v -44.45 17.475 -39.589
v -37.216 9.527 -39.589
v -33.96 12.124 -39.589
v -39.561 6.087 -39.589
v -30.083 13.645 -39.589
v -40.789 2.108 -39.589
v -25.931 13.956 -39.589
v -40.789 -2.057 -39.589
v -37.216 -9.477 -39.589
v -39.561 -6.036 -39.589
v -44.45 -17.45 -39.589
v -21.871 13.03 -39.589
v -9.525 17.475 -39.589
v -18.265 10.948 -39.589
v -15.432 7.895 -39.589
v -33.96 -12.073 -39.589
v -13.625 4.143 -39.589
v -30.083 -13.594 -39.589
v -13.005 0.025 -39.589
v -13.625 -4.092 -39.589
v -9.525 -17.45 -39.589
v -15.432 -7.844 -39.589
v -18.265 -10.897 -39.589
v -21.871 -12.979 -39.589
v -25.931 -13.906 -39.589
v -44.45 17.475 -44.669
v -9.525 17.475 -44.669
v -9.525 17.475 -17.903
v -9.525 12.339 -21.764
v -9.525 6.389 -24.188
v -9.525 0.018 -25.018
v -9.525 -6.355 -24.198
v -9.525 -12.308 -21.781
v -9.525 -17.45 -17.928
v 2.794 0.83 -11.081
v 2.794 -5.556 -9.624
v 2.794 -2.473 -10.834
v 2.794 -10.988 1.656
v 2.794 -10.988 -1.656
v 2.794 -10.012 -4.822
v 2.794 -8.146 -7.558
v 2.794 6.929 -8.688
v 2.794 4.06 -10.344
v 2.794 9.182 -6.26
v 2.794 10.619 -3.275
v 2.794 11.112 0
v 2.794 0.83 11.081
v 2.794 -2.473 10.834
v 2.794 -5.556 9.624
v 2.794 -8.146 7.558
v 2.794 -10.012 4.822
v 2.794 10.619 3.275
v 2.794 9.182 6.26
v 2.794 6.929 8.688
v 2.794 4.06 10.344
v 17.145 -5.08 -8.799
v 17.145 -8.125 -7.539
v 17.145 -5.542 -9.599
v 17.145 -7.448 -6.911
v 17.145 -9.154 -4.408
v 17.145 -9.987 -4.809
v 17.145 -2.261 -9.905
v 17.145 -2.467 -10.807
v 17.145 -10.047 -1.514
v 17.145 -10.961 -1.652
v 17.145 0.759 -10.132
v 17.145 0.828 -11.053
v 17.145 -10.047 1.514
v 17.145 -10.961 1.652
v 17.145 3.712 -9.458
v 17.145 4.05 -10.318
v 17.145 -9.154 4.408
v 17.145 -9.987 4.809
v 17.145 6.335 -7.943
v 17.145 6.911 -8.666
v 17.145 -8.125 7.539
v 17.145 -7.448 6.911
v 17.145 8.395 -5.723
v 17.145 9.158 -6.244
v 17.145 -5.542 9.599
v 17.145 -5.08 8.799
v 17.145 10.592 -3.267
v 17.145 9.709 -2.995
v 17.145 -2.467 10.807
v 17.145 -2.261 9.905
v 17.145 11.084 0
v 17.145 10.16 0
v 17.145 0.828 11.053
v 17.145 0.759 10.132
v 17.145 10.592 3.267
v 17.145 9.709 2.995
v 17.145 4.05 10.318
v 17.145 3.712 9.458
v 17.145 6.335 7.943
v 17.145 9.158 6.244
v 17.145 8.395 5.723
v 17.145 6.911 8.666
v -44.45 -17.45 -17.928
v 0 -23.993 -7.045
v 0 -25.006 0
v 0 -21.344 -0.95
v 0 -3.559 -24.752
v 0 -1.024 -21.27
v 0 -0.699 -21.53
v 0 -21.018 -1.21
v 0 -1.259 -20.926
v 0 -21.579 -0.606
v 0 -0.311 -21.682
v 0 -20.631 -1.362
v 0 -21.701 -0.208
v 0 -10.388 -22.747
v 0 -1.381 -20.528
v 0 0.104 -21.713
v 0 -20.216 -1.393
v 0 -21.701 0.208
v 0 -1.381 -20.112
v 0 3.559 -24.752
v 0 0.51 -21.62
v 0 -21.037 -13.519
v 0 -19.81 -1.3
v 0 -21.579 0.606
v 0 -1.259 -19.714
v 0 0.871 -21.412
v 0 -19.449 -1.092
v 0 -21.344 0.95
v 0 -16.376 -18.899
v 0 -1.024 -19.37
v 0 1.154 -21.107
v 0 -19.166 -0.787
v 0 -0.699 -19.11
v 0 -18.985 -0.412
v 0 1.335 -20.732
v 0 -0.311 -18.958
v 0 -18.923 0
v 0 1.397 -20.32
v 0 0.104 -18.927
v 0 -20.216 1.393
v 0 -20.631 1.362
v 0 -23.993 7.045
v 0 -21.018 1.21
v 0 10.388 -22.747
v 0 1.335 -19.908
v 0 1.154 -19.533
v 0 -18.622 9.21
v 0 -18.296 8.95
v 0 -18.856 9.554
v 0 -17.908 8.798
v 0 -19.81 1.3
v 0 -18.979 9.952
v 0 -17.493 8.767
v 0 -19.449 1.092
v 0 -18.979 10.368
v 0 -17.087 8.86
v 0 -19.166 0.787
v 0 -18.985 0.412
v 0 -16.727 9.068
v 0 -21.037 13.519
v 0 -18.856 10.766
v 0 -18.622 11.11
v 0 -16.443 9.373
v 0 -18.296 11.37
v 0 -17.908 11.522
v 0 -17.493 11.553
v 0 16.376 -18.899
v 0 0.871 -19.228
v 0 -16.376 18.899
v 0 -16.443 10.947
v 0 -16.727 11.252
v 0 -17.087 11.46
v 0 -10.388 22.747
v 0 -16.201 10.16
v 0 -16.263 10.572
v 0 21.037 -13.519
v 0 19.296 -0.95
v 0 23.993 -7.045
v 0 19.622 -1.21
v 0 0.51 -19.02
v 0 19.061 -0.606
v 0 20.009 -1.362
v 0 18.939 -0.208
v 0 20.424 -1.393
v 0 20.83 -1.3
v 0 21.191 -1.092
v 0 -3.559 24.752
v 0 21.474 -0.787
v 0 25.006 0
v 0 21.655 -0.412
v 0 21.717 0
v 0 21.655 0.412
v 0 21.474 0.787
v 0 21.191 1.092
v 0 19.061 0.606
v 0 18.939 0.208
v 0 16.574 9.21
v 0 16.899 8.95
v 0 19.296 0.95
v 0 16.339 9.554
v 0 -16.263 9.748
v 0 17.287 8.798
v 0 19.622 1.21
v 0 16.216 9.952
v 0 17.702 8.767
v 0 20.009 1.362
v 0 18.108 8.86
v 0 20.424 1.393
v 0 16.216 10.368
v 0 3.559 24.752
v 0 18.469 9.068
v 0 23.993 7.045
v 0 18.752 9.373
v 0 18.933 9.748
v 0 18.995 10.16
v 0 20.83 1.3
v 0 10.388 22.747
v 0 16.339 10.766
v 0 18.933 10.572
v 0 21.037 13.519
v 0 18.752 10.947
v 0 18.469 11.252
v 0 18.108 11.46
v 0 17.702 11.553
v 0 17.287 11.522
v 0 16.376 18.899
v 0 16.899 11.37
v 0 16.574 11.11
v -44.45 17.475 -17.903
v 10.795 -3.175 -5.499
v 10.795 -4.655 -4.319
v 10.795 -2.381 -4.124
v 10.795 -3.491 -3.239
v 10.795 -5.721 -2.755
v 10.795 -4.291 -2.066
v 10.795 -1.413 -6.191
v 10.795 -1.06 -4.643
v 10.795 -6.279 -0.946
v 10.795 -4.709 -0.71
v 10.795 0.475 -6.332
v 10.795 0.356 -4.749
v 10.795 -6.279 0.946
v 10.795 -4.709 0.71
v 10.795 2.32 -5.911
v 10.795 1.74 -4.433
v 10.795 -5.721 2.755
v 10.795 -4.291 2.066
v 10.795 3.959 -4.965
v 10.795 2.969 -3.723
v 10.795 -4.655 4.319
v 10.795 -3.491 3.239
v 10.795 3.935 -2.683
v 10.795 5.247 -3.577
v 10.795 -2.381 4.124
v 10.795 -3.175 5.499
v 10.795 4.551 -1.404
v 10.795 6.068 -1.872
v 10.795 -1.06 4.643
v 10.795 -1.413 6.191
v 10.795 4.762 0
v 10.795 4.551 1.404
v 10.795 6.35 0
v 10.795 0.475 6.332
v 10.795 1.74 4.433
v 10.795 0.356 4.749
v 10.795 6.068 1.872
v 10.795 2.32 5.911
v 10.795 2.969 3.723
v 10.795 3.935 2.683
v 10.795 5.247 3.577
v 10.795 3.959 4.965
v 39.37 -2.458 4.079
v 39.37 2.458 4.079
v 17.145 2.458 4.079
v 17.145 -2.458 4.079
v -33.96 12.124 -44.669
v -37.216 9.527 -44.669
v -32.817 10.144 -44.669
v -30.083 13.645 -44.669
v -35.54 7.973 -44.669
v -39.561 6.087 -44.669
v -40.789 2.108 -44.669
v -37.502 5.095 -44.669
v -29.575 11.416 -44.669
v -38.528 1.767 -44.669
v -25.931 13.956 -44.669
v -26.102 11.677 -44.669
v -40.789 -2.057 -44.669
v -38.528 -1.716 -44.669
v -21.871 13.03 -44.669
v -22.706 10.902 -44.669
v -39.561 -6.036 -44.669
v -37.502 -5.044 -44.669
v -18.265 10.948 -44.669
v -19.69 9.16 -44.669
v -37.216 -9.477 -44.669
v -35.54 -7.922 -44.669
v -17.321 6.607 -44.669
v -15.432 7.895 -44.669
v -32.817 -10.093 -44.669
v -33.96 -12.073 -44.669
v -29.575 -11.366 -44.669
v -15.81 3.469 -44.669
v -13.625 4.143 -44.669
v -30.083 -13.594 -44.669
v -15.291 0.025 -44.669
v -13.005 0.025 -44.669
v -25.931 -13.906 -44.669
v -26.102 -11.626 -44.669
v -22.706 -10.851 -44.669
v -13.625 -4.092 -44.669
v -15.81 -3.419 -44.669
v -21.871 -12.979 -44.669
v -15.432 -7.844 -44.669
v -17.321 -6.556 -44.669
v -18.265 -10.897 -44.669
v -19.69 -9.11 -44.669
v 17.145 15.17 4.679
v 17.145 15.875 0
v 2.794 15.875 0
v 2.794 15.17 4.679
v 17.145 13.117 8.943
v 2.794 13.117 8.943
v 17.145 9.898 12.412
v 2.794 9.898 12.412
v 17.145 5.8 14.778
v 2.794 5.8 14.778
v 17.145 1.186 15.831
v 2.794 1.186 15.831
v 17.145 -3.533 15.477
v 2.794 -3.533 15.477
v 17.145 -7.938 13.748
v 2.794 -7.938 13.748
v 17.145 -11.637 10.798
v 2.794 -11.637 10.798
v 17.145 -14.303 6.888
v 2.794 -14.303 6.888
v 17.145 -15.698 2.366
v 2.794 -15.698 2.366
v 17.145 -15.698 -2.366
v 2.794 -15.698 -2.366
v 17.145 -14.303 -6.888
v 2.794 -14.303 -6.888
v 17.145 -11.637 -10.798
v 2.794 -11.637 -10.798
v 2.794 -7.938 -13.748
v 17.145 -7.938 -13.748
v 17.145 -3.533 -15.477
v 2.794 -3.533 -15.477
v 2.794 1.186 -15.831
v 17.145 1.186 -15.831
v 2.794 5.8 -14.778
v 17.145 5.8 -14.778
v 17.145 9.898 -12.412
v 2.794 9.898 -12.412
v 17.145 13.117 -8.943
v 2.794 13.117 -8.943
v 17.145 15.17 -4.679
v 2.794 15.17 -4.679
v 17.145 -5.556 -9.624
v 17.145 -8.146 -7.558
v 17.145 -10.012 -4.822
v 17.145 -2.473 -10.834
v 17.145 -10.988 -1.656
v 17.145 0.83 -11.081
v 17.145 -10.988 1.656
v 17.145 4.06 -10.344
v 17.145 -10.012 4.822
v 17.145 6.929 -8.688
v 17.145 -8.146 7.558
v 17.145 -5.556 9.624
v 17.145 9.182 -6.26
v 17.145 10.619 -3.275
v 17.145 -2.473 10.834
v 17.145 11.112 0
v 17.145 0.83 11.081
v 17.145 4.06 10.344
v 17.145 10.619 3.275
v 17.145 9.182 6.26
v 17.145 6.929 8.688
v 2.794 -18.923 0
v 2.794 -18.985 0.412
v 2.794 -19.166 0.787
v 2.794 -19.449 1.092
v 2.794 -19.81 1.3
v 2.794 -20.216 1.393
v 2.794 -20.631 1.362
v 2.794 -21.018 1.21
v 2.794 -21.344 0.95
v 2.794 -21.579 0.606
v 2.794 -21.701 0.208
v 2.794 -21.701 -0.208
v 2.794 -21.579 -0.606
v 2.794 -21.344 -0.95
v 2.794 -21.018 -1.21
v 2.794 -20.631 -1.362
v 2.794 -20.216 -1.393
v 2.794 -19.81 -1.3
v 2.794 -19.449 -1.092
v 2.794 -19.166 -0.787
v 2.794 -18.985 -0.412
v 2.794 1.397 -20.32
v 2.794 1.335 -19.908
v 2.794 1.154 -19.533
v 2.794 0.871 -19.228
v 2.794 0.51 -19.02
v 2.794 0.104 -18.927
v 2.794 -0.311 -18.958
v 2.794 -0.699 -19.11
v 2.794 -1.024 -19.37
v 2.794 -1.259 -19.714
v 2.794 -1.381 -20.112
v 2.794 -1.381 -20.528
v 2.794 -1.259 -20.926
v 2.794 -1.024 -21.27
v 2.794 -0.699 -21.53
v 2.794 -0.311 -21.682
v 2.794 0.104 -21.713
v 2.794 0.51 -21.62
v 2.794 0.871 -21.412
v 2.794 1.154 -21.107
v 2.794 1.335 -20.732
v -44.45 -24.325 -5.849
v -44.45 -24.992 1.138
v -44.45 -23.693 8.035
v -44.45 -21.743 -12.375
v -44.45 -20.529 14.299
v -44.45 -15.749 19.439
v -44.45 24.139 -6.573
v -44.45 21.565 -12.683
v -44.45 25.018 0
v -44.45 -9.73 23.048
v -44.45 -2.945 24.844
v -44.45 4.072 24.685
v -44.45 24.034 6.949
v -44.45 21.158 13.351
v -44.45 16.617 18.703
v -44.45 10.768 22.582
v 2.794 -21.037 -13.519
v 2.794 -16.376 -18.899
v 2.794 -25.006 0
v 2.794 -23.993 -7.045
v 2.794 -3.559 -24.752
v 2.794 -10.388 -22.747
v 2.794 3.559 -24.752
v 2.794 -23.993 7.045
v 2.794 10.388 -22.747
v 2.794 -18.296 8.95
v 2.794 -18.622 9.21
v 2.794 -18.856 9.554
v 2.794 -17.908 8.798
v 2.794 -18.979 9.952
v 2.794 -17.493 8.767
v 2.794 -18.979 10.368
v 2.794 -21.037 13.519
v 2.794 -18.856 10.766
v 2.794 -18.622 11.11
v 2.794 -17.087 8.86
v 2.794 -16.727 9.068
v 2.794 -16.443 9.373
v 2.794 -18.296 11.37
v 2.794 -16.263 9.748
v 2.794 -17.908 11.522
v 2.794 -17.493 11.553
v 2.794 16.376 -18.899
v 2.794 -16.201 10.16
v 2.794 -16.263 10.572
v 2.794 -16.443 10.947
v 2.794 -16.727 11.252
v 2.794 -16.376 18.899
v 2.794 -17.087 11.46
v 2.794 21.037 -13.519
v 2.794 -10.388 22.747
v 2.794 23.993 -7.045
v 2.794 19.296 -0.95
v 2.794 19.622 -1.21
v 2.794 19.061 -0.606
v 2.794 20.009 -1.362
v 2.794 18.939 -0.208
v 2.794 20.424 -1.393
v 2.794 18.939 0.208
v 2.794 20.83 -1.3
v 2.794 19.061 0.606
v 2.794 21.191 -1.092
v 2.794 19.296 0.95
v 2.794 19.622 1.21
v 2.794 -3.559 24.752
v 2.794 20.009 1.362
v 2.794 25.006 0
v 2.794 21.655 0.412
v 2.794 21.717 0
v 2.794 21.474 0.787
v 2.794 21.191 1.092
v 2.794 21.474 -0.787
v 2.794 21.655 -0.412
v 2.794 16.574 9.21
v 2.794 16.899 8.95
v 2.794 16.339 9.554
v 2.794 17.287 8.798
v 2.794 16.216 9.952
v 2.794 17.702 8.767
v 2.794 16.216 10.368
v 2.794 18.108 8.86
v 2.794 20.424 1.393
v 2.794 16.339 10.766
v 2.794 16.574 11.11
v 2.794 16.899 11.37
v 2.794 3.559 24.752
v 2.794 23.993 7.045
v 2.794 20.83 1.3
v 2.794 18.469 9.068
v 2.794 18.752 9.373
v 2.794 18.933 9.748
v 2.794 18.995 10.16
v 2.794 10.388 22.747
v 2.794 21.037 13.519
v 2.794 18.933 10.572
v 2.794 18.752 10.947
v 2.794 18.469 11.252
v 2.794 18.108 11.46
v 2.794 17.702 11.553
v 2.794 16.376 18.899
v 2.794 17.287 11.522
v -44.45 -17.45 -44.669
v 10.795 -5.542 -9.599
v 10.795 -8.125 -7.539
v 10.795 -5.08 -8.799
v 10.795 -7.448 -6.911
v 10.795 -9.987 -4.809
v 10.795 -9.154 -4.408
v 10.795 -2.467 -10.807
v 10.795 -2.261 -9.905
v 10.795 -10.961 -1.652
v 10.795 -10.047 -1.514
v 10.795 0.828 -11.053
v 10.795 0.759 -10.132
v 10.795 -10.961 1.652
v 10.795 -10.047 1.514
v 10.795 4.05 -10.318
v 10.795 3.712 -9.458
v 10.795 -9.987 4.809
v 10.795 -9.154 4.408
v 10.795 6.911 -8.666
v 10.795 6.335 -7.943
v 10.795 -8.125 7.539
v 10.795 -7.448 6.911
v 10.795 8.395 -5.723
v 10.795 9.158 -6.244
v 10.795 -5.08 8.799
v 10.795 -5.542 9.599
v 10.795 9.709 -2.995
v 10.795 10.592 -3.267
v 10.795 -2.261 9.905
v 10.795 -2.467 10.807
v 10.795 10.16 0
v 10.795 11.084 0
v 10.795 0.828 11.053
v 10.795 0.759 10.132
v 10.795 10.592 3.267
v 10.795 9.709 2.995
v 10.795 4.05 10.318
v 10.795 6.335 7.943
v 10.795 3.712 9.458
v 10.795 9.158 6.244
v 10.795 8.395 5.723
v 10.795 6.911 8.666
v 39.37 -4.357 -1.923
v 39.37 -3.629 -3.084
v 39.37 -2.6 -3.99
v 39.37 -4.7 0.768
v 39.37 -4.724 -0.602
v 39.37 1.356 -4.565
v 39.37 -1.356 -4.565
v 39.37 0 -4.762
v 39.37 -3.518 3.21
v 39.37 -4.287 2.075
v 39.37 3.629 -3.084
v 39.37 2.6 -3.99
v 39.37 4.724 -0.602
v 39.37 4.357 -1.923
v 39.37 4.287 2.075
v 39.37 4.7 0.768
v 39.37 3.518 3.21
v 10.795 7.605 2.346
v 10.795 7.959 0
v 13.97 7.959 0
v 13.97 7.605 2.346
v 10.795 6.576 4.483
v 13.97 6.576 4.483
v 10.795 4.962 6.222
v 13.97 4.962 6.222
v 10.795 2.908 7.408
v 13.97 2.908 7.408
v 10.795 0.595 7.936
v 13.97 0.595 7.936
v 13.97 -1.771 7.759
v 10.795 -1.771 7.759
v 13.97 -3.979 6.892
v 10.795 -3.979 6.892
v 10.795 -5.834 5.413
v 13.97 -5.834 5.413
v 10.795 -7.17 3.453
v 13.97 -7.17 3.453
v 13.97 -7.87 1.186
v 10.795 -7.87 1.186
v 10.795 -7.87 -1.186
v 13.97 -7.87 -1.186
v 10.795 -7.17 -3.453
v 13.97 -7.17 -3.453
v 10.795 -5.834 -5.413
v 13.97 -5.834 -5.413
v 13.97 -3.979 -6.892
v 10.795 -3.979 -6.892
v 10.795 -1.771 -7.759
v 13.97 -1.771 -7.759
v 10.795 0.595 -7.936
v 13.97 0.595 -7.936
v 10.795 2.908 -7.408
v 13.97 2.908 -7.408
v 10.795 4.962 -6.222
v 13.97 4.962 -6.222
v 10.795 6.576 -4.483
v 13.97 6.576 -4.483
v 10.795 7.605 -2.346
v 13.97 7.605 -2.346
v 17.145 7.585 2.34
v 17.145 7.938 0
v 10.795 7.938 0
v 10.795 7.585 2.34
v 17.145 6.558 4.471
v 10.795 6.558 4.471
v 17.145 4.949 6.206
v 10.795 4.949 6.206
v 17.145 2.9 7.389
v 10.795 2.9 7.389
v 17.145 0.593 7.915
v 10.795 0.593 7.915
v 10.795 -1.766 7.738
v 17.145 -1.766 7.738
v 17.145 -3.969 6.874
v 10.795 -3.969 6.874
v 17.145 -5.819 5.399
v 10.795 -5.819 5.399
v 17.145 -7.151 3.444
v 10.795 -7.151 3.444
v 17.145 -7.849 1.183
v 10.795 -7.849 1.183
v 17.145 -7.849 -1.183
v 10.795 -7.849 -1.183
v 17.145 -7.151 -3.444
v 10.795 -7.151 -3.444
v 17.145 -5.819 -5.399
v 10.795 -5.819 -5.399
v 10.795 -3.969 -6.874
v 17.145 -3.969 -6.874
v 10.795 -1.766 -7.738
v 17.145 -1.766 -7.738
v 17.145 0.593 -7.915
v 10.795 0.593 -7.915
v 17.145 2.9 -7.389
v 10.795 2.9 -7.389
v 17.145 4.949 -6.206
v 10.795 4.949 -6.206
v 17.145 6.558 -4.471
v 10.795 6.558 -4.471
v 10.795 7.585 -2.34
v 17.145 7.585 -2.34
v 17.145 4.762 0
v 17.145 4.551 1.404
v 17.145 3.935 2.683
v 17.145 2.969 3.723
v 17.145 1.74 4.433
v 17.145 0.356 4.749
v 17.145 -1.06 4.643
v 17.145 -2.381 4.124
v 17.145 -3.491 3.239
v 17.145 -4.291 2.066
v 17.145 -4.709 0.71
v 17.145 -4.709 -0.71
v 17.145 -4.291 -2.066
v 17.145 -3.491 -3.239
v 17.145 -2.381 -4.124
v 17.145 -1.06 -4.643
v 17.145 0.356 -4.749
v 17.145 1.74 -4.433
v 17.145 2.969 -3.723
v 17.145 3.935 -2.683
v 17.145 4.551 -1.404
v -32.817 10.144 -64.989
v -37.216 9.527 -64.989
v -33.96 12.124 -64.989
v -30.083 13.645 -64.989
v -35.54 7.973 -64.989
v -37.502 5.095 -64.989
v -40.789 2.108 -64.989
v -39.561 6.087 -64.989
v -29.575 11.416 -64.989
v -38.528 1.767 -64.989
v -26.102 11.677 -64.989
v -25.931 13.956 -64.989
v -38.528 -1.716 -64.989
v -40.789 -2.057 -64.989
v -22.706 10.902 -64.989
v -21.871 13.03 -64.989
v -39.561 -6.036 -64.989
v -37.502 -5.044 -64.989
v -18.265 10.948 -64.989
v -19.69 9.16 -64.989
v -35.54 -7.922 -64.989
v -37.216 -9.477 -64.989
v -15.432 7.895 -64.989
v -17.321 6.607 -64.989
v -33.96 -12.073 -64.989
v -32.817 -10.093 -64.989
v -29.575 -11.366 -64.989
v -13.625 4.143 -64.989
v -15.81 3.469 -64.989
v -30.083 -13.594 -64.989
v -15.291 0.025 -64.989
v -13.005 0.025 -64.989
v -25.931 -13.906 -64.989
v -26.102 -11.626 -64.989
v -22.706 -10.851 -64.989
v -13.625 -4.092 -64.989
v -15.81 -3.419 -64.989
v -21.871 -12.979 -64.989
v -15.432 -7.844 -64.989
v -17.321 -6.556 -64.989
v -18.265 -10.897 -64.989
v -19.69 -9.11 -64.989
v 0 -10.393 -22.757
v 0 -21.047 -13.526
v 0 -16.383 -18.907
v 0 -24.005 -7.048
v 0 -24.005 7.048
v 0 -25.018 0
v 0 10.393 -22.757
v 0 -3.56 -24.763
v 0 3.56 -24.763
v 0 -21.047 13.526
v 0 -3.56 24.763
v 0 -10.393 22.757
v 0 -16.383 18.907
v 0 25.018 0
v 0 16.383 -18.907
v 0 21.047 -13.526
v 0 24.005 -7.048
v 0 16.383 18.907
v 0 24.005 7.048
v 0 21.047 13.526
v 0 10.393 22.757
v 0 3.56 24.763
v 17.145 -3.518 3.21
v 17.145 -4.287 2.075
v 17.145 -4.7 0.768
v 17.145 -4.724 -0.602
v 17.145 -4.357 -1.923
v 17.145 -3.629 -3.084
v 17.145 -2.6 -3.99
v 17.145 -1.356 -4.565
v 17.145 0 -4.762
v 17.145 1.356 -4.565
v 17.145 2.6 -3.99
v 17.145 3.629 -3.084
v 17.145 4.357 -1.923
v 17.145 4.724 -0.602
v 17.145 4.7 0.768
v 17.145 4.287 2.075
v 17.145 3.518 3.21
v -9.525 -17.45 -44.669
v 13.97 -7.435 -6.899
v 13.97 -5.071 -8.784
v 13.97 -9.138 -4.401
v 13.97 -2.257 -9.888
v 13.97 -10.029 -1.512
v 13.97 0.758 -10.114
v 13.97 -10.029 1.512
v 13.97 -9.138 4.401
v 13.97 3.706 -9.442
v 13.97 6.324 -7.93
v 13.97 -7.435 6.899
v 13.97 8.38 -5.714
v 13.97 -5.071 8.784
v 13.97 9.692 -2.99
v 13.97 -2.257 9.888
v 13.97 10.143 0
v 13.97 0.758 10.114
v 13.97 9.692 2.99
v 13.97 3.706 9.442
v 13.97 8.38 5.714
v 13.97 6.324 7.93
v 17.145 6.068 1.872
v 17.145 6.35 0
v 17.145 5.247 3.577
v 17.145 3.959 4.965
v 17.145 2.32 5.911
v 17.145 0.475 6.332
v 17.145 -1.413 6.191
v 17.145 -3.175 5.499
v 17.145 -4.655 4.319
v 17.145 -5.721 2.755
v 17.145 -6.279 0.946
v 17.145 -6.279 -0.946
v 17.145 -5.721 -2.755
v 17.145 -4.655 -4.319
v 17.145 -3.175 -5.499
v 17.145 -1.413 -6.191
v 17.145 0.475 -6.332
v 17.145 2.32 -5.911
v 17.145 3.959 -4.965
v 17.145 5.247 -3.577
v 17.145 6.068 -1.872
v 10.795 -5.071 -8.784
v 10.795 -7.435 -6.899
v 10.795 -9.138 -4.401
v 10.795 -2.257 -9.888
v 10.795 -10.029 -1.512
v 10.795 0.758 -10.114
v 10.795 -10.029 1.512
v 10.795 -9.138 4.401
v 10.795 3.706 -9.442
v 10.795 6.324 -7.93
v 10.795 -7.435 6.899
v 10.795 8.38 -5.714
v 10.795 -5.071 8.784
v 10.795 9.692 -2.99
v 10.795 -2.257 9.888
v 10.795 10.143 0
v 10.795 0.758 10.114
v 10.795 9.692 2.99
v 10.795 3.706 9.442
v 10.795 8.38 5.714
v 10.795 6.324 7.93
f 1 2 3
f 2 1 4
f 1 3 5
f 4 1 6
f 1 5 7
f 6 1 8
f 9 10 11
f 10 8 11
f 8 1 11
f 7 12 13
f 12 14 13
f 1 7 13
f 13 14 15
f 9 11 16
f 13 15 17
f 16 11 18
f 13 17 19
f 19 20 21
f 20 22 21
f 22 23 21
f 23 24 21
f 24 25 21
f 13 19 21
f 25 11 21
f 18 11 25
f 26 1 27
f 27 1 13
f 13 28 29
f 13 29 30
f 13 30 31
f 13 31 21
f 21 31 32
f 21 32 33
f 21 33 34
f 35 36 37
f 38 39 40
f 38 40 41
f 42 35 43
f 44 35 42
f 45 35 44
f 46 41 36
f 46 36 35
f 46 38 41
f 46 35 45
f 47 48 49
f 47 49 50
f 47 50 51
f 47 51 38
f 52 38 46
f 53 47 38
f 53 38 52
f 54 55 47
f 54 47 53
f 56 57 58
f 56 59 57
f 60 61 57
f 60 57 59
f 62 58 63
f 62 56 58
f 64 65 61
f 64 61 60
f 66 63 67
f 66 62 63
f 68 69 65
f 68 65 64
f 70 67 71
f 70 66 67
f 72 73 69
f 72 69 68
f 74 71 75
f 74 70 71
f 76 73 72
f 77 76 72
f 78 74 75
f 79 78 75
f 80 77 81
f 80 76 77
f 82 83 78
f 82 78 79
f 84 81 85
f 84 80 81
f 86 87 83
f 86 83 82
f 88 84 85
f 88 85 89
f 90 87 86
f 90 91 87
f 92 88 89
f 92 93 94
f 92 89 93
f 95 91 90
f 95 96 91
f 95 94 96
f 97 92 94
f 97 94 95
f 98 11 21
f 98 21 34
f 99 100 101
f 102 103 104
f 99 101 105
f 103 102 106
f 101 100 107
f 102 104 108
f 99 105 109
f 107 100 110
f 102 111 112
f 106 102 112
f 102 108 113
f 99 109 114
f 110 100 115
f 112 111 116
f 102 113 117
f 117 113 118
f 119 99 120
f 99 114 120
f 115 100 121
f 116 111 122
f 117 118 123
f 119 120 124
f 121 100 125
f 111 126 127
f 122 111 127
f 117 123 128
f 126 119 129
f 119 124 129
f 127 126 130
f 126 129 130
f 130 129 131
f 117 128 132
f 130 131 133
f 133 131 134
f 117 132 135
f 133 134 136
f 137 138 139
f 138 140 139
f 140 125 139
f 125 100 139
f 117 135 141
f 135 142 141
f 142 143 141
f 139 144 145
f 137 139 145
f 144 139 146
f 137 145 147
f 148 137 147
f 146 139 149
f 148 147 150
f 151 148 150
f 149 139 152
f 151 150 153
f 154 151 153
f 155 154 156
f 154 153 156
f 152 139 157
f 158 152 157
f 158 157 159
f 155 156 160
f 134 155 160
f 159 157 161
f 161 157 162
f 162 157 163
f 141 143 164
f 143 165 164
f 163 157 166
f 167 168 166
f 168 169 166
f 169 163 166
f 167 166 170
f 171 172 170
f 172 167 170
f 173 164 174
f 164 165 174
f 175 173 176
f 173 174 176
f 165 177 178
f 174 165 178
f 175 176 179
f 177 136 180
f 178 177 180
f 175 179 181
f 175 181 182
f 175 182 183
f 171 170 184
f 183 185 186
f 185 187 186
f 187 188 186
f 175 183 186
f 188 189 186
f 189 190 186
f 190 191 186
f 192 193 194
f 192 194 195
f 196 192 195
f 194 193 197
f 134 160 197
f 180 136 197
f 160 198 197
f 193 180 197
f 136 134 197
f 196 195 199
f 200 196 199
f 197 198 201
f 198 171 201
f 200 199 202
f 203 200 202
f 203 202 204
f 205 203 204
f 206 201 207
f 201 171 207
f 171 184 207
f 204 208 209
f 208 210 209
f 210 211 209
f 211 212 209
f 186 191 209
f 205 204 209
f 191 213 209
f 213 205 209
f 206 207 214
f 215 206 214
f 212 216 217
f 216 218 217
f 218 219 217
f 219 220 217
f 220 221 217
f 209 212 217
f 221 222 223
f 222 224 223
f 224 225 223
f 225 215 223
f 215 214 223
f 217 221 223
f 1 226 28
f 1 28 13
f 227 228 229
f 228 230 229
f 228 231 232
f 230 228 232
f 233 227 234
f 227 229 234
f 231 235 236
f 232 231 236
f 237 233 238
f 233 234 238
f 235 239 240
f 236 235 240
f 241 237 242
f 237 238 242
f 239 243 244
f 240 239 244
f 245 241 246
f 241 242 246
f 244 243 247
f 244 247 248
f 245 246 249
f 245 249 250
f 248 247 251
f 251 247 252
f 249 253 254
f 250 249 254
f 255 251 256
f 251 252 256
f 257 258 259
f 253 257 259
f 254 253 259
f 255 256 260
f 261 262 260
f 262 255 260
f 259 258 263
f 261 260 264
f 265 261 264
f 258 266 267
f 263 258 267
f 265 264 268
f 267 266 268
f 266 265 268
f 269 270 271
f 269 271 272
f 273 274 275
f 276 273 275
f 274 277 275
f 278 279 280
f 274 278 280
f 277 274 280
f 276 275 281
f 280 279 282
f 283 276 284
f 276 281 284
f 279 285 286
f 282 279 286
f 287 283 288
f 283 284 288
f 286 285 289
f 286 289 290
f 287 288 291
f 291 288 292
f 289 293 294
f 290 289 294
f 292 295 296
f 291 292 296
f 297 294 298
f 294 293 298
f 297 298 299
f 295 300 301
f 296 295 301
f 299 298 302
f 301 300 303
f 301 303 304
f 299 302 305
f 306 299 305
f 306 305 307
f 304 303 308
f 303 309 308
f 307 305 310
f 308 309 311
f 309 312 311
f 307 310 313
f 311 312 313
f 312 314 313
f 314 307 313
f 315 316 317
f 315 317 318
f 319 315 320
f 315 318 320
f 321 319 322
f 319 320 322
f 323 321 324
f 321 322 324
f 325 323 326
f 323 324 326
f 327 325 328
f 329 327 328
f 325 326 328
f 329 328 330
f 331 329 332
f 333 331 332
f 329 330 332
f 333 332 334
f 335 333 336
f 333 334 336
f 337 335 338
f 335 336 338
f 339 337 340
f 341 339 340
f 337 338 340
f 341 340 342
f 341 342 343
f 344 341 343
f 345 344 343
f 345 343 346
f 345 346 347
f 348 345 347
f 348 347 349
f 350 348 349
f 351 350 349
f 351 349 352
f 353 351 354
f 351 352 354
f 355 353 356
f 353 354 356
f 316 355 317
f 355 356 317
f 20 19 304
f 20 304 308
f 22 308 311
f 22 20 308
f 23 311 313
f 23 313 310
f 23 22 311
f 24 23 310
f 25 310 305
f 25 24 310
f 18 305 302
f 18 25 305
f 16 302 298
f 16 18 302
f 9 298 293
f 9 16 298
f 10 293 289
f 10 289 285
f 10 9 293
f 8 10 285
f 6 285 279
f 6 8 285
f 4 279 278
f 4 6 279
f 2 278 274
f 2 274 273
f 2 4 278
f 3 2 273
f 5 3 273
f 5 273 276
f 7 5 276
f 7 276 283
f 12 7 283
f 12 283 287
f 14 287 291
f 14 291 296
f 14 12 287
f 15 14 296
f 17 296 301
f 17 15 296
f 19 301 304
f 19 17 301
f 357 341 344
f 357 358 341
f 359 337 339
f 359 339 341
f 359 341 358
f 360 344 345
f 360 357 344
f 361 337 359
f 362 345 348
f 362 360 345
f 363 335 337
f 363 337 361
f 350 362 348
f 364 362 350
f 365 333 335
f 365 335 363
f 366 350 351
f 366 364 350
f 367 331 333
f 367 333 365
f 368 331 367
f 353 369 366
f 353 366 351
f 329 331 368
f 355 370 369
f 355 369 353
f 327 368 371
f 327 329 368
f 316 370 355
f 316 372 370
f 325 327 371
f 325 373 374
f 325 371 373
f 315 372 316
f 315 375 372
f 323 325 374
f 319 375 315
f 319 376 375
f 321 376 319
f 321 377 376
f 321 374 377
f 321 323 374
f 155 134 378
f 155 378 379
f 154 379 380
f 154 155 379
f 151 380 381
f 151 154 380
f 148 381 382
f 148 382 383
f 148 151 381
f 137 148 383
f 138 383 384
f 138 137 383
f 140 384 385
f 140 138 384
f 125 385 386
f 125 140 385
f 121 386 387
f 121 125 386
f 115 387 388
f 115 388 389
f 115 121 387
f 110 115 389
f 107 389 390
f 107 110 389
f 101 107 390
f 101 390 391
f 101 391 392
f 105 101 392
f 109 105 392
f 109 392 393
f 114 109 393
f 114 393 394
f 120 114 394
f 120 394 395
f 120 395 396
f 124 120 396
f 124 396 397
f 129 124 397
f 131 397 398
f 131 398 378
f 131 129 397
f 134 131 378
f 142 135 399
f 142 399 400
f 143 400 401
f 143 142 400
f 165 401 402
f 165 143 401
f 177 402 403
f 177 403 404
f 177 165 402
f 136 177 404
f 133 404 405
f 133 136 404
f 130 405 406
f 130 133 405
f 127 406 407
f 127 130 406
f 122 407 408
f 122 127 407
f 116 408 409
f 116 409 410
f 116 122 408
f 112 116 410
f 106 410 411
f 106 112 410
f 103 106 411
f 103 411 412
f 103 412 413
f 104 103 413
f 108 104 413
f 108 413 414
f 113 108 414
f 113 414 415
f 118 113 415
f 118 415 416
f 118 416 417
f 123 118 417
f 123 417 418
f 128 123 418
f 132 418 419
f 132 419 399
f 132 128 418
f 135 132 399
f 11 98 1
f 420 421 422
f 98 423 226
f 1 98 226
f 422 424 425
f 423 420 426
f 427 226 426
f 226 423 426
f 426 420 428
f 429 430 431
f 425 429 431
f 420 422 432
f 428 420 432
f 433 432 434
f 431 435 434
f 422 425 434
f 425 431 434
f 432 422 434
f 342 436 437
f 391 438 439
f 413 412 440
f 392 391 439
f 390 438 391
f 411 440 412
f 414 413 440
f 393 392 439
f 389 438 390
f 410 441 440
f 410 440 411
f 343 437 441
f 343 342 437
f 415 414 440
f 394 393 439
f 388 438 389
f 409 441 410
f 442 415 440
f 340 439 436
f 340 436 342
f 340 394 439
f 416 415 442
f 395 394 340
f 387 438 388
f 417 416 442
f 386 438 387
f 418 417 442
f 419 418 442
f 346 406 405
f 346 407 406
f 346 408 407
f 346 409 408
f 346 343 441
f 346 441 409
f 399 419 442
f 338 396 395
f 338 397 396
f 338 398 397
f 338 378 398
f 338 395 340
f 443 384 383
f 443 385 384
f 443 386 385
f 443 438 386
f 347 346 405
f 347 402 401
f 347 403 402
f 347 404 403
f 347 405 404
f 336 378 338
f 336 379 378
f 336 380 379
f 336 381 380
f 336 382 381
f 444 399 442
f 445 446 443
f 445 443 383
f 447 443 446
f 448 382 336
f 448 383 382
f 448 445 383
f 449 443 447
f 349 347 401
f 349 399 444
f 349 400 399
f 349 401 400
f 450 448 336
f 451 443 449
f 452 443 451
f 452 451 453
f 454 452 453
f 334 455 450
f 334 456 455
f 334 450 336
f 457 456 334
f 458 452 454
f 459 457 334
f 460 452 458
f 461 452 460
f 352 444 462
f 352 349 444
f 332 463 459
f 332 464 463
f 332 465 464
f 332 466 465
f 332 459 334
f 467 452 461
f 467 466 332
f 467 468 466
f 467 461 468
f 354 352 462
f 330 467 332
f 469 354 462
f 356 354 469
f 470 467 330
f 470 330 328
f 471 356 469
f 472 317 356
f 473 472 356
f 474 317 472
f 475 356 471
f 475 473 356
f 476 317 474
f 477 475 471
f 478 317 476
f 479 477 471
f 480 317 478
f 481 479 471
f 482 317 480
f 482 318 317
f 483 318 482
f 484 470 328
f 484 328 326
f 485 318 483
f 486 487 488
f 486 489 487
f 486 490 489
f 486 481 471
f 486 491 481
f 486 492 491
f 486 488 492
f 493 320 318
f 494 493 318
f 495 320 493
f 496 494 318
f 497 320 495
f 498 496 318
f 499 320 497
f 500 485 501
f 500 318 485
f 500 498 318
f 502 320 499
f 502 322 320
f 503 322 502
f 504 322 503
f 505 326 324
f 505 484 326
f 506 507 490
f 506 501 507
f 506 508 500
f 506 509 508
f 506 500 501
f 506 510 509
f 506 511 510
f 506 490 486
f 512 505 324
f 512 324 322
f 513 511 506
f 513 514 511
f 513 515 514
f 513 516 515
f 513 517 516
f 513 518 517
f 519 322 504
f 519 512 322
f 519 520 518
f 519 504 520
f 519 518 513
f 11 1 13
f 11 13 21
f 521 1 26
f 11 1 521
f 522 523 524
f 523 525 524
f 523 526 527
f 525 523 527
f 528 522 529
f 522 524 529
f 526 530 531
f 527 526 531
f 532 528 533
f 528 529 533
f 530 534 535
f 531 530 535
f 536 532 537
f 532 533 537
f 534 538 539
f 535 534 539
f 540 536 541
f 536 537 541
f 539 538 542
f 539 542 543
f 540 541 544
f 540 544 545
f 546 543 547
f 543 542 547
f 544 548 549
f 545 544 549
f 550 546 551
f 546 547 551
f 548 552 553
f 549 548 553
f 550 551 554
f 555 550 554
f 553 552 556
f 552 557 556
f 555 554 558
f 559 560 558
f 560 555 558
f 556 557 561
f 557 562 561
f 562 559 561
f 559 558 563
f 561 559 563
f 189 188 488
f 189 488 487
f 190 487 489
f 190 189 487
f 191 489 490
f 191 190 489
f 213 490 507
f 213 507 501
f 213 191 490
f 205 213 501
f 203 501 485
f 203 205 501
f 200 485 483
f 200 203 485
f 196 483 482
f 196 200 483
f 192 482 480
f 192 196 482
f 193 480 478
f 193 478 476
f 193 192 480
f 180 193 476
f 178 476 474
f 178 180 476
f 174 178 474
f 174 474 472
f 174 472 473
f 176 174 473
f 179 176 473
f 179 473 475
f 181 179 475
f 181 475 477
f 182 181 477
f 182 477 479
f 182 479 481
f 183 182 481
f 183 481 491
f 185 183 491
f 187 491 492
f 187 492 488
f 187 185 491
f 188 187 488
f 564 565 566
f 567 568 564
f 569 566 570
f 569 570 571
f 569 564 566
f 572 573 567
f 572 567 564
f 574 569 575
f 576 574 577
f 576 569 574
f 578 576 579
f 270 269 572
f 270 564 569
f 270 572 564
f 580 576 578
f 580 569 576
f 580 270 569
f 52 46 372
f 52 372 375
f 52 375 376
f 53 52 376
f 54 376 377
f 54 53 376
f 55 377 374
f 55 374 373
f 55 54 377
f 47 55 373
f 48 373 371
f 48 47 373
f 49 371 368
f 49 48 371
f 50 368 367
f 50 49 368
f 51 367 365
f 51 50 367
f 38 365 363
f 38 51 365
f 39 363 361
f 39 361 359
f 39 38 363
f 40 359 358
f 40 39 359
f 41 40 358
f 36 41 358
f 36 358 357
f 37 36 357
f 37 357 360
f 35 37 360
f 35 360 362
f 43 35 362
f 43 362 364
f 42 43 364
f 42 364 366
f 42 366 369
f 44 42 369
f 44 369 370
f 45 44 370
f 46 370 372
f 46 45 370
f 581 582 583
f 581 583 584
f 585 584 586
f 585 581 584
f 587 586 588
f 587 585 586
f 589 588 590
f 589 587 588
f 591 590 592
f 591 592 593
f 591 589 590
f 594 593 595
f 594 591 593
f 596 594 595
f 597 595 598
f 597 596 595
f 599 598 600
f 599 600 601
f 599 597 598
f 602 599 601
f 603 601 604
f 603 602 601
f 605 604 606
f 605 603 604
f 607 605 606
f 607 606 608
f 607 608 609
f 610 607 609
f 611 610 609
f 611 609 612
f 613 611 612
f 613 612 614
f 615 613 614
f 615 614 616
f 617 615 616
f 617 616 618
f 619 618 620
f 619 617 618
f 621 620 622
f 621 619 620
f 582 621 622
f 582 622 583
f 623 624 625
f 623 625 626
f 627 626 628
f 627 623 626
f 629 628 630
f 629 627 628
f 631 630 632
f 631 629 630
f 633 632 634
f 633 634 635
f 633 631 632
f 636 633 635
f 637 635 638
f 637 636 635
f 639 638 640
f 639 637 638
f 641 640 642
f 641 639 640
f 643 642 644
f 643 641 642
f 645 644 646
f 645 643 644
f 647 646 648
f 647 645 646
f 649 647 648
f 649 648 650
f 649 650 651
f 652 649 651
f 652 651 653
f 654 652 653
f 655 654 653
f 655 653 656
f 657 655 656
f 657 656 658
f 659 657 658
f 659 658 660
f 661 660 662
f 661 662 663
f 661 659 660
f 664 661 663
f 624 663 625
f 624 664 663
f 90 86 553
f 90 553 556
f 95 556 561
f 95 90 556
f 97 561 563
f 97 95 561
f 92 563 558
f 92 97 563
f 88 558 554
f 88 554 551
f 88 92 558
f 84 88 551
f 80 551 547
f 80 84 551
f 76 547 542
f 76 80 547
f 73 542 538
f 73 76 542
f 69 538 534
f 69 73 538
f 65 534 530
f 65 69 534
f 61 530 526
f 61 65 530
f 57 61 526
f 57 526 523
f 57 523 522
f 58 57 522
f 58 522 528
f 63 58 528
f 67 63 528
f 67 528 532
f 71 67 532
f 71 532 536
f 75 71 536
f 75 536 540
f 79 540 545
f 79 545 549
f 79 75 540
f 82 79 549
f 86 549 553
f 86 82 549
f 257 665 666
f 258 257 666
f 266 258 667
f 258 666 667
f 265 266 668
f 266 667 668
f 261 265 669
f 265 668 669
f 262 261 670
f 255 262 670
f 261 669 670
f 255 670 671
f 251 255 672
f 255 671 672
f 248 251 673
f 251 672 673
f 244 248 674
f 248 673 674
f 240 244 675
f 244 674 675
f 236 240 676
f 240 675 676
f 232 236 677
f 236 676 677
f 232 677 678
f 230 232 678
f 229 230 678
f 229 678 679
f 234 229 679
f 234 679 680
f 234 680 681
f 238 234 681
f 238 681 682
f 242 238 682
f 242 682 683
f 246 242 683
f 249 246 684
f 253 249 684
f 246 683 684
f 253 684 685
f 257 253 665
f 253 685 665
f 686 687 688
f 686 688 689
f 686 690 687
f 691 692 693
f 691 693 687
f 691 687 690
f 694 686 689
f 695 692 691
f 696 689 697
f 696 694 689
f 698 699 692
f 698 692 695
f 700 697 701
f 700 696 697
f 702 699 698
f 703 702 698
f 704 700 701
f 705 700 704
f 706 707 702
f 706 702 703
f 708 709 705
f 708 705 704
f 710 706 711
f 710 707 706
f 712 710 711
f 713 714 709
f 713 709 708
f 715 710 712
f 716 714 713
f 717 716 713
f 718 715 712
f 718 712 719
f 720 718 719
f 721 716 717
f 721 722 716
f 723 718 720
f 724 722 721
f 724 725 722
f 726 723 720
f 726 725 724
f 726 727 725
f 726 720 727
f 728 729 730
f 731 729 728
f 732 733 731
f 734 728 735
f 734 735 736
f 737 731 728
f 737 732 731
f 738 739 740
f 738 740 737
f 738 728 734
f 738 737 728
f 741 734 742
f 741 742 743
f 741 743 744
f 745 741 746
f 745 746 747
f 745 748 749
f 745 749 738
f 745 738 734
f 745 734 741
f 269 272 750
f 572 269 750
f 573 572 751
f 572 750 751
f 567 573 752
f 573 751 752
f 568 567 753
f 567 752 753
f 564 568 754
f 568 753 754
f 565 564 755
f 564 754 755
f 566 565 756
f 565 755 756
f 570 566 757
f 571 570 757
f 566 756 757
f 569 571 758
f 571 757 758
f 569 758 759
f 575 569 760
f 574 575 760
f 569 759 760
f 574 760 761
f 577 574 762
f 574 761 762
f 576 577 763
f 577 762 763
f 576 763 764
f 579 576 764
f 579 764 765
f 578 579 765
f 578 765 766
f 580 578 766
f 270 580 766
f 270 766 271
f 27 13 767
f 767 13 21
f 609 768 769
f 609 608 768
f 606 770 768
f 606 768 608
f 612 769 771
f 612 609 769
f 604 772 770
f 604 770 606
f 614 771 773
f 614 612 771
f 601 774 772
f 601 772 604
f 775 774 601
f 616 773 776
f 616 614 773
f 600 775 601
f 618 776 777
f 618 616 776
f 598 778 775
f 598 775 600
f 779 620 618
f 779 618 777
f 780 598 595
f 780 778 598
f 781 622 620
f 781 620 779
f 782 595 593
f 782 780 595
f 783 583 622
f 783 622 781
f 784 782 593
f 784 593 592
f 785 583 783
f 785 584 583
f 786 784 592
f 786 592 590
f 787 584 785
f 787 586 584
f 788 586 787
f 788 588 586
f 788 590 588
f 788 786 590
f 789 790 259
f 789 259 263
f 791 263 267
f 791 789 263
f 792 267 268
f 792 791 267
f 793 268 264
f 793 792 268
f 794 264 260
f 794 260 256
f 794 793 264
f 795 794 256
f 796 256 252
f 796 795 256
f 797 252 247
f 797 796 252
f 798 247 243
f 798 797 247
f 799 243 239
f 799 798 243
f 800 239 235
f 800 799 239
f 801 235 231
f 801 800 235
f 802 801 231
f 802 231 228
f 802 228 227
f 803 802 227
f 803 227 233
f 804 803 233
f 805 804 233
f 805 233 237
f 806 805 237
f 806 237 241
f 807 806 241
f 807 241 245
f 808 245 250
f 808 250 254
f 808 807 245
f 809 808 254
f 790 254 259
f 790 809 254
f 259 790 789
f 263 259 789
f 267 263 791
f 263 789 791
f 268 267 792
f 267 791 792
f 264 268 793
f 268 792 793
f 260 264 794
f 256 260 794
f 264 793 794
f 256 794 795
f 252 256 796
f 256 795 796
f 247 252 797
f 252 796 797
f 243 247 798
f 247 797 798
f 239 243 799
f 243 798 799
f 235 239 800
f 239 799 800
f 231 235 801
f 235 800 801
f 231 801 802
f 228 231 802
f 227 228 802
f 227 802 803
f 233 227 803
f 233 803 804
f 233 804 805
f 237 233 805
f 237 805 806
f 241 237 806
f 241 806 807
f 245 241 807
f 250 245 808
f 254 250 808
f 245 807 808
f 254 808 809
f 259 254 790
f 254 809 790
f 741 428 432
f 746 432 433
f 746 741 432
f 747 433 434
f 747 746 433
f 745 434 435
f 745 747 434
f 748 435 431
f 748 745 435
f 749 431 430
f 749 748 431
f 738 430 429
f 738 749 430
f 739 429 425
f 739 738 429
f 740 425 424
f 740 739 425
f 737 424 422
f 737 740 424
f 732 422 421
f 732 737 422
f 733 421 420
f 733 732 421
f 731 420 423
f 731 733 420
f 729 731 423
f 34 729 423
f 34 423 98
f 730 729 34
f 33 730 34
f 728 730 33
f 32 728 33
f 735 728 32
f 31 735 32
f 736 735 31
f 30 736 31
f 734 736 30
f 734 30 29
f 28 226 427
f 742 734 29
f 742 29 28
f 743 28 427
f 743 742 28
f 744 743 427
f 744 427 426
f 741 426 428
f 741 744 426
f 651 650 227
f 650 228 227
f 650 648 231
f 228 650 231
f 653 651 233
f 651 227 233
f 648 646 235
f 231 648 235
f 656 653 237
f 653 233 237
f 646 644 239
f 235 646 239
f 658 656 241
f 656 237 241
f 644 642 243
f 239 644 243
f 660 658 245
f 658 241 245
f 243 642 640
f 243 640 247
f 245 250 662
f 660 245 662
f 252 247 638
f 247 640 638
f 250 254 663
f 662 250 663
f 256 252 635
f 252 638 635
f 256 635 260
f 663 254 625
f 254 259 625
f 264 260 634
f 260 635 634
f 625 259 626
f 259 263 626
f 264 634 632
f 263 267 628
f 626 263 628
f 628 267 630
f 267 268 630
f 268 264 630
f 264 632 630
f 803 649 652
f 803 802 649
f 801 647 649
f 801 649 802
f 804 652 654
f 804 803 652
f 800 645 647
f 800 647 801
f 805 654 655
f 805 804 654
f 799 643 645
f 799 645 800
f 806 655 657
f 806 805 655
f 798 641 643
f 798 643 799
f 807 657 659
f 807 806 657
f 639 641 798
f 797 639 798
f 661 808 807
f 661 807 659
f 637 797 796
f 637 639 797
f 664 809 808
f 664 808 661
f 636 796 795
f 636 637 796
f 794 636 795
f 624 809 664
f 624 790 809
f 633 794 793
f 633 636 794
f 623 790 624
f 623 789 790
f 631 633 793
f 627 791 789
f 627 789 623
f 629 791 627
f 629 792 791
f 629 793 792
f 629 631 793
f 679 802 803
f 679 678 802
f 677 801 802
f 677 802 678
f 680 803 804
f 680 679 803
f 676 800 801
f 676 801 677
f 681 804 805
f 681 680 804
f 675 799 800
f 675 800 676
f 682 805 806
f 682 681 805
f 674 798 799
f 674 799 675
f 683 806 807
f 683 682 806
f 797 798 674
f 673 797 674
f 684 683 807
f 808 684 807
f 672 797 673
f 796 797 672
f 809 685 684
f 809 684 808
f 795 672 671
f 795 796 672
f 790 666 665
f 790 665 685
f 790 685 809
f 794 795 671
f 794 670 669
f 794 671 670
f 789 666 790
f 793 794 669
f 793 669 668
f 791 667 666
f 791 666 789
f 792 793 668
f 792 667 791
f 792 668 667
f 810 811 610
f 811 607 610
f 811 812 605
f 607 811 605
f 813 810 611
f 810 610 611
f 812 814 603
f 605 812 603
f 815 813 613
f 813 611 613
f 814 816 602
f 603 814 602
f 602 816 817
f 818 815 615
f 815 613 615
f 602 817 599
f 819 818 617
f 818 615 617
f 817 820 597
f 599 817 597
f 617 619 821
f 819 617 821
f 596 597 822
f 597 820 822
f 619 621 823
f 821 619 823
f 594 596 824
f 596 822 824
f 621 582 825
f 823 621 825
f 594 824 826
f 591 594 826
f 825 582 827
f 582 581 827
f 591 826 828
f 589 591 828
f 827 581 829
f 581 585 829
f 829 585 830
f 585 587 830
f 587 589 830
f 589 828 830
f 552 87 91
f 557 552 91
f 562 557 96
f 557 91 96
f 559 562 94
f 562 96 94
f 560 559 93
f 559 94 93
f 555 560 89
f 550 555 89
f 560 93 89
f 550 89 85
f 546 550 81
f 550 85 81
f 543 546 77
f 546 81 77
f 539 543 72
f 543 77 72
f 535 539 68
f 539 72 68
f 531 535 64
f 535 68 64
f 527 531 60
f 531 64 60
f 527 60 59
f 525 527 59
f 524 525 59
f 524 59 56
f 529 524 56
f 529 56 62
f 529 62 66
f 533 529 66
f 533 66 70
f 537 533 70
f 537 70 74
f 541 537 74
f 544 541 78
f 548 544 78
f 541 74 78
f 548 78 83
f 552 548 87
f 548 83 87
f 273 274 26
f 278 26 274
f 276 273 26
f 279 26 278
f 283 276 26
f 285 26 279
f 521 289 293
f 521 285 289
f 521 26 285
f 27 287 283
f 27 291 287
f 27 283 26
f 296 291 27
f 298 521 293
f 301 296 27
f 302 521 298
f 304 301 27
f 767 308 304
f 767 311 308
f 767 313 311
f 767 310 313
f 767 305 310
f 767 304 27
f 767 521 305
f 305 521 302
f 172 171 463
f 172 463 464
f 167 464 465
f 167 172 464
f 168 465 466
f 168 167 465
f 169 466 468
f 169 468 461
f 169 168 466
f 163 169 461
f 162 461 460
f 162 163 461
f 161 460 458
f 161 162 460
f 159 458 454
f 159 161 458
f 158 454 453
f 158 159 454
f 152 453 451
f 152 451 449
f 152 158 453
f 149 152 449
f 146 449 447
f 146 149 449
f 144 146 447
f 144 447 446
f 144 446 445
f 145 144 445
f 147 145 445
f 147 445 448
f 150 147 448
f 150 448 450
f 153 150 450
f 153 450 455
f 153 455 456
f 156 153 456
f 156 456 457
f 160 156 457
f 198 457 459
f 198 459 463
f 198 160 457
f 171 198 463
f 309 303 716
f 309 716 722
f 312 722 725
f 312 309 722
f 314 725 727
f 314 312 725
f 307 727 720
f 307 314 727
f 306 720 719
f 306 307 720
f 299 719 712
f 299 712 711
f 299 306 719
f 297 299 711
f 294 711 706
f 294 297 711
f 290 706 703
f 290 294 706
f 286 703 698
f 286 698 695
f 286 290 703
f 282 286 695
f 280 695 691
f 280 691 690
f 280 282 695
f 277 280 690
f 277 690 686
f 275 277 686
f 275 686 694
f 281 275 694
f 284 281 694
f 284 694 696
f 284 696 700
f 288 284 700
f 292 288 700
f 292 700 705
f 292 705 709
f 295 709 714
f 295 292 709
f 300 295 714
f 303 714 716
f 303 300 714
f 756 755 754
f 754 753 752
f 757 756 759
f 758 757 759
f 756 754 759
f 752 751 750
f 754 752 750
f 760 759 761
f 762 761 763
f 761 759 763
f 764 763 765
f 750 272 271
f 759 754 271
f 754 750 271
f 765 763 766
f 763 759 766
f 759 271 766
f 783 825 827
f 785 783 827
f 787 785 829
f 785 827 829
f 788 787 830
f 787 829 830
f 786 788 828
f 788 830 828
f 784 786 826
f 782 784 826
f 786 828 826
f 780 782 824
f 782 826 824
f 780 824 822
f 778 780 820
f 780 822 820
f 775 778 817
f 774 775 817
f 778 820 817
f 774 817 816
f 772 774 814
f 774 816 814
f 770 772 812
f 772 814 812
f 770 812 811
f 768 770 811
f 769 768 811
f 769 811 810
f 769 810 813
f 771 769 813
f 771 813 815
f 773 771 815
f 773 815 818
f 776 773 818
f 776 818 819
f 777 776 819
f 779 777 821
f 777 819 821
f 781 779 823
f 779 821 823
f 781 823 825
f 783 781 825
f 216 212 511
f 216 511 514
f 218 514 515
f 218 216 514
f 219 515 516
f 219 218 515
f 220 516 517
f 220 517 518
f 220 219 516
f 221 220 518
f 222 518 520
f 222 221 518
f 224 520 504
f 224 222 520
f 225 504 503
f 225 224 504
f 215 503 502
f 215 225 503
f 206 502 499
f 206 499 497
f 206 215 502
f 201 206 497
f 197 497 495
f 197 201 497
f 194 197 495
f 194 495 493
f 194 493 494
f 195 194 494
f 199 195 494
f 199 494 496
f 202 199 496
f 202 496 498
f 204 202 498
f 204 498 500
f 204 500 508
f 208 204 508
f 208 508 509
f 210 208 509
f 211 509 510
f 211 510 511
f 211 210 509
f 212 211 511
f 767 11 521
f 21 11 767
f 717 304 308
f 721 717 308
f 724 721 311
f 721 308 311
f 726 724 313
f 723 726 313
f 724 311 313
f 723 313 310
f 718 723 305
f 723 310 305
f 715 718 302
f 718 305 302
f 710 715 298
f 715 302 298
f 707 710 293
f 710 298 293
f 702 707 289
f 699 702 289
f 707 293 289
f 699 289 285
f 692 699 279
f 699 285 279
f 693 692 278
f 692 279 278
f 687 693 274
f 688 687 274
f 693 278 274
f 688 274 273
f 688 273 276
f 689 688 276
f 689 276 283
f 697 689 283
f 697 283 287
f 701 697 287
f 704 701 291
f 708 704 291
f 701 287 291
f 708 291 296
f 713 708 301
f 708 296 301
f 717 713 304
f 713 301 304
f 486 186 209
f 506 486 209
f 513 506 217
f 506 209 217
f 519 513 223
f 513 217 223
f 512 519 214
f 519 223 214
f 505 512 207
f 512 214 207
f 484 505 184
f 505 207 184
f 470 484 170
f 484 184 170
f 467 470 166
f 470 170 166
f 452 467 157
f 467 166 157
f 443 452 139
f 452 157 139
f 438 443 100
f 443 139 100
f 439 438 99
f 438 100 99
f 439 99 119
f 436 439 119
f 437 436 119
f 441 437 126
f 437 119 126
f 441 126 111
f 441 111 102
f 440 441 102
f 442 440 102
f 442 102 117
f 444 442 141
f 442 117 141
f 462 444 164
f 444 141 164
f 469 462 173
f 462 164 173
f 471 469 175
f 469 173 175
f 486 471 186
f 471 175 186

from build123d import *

# Parameters (mm, degrees)
F0_R      = 25.0063
F0_R_2    = 1.397
F1_DEPTH  = 2.794
F2_R      = 15.875
F2_R_2    = 11.1125
F3_DEPTH  = 14.351
F5_DEPTH  = 22.225
F6_R      = 25.0180713207
F7_DEPTH  = 44.45
F9_DEPTH  = 34.925
F10_R     = 6.35
F10_R_2   = 4.7625
F11_DEPTH = 6.35
F12_R     = 7.9375
F12_R_2   = 6.35
F13_DEPTH = 6.35
F14_R     = 11.08447927
F14_R_2   = 10.16
F15_DEPTH = 6.35
F16_R     = 10.1427061105
F16_R_2   = 7.9585807432
F17_DEPTH = 3.175
F19_W     = 34.925
F19_H     = 34.925
F19_R     = 13.97
F20_DEPTH = 5.08
F21_R     = 13.97
F21_R_2   = 11.684
F22_DEPTH = 20.32


with BuildPart() as f1:
    # F0 (on Right) → F1 (new body)
    with BuildSketch(Plane.YZ):
        Circle(F0_R)
        with Locations((0, -20.32)):
            Circle(F0_R_2, mode=Mode.SUBTRACT)
        with Locations((-20.32, 0)):
            Circle(F0_R_2, mode=Mode.SUBTRACT)
        with Locations((-17.5976362049, 10.16)):
            Circle(F0_R_2, mode=Mode.SUBTRACT)
        with Locations((20.32, 0)):
            Circle(F0_R_2, mode=Mode.SUBTRACT)
        with Locations((17.5976362049, 10.16)):
            Circle(F0_R_2, mode=Mode.SUBTRACT)
    extrude(amount=F1_DEPTH)

    # F2 (on face) → F3 (join)
    with BuildSketch(Plane.YZ.offset(2.794)):
        Circle(F2_R)
        Circle(F2_R_2, mode=Mode.SUBTRACT)
    extrude(amount=F3_DEPTH)


with BuildPart() as f5:
    # F4 (on face) → F5 (new body)
    with BuildSketch(Plane.YZ.offset(17.145)):
        with BuildLine():
            Line((2.4582480132, 4.0790223039), (-2.4582480132, 4.0790223039))
            ThreePointArc((-2.4582480132, 4.0790223039), (0, -4.7625), (2.4582480132, 4.0790223039))
        make_face()
    extrude(amount=F5_DEPTH)


with BuildPart() as f7:
    # F6 (on Right) → F7 (new body)
    with BuildSketch(Plane.YZ):
        Circle(F6_R)
    extrude(amount=-F7_DEPTH)

    # F8 (on face) → F9 (join)
    with BuildSketch(Plane(origin=(-44.45, 0, 0), x_dir=(0, -1, 0), z_dir=(-1, 0, 0))):
        with BuildLine():
            Line((-17.475200817, -38.1248667836), (-17.475200817, -39.588577036))
            Line((-17.475200817, -39.588577036), (17.449799183, -39.588577036))
            Line((17.449799183, -39.588577036), (17.449799183, -38.6783927679))
            Line((17.449799183, -38.6783927679), (17.449799183, -17.9278666071))
            ThreePointArc((17.449799183, -17.9278666071), (-0.0177360441, -25.0180650339), (-17.475200817, -17.9031072447))
            Line((-17.475200817, -17.9031072447), (-17.475200817, -38.1248667836))
        make_face()
    extrude(amount=-F9_DEPTH)


with BuildPart() as f11:
    # F10 (on face) → F11 (new body)
    with BuildSketch(Plane.YZ.offset(17.145)):
        Circle(F10_R)
        Circle(F10_R_2, mode=Mode.SUBTRACT)
    extrude(amount=-F11_DEPTH)


with BuildPart() as f13:
    # F12 (on face) → F13 (new body)
    with BuildSketch(Plane.YZ.offset(17.145)):
        Circle(F12_R)
        Circle(F12_R_2, mode=Mode.SUBTRACT)
    extrude(amount=-F13_DEPTH)


with BuildPart() as f15:
    # F14 (on face) → F15 (new body)
    with BuildSketch(Plane.YZ.offset(17.145)):
        Circle(F14_R)
        Circle(F14_R_2, mode=Mode.SUBTRACT)
    extrude(amount=-F15_DEPTH)


with BuildPart() as f17:
    # F16 (on face) → F17 (new body)
    with BuildSketch(Plane.YZ.offset(17.145)):
        Circle(F16_R)
        Circle(F16_R_2, mode=Mode.SUBTRACT)
    extrude(amount=F17_DEPTH)


with BuildPart() as f17_1:
    # F18: moved
    add(f17.part.moved(Location((-6.35, 0, 0))))


with BuildPart() as f20:
    # F19 (on face) → F20 (new body)
    with BuildSketch(Plane(origin=(0, 0, -39.588577036), x_dir=(1, 0, 0), z_dir=(0, 0, -1))):
        with Locations((-26.9875, -0.012700817)):
            Rectangle(F19_W, F19_H)
        with Locations((-26.9748, -0.025400817)):
            Circle(F19_R, mode=Mode.SUBTRACT)
    extrude(amount=F20_DEPTH)


with BuildPart() as f22:
    # F21 (on face) → F22 (new body)
    with BuildSketch(Plane(origin=(0, 0, -44.668577036), x_dir=(1, 0, 0), z_dir=(0, 0, -1))):
        with Locations((-26.9748, -0.025400817)):
            Circle(F21_R)
        with Locations((-26.9748, -0.025400817)):
            Circle(F21_R_2, mode=Mode.SUBTRACT)
    extrude(amount=F22_DEPTH)


solid = Compound([f1.part, f5.part, f7.part, f11.part, f13.part, f15.part, f17_1.part, f20.part, f22.part])
